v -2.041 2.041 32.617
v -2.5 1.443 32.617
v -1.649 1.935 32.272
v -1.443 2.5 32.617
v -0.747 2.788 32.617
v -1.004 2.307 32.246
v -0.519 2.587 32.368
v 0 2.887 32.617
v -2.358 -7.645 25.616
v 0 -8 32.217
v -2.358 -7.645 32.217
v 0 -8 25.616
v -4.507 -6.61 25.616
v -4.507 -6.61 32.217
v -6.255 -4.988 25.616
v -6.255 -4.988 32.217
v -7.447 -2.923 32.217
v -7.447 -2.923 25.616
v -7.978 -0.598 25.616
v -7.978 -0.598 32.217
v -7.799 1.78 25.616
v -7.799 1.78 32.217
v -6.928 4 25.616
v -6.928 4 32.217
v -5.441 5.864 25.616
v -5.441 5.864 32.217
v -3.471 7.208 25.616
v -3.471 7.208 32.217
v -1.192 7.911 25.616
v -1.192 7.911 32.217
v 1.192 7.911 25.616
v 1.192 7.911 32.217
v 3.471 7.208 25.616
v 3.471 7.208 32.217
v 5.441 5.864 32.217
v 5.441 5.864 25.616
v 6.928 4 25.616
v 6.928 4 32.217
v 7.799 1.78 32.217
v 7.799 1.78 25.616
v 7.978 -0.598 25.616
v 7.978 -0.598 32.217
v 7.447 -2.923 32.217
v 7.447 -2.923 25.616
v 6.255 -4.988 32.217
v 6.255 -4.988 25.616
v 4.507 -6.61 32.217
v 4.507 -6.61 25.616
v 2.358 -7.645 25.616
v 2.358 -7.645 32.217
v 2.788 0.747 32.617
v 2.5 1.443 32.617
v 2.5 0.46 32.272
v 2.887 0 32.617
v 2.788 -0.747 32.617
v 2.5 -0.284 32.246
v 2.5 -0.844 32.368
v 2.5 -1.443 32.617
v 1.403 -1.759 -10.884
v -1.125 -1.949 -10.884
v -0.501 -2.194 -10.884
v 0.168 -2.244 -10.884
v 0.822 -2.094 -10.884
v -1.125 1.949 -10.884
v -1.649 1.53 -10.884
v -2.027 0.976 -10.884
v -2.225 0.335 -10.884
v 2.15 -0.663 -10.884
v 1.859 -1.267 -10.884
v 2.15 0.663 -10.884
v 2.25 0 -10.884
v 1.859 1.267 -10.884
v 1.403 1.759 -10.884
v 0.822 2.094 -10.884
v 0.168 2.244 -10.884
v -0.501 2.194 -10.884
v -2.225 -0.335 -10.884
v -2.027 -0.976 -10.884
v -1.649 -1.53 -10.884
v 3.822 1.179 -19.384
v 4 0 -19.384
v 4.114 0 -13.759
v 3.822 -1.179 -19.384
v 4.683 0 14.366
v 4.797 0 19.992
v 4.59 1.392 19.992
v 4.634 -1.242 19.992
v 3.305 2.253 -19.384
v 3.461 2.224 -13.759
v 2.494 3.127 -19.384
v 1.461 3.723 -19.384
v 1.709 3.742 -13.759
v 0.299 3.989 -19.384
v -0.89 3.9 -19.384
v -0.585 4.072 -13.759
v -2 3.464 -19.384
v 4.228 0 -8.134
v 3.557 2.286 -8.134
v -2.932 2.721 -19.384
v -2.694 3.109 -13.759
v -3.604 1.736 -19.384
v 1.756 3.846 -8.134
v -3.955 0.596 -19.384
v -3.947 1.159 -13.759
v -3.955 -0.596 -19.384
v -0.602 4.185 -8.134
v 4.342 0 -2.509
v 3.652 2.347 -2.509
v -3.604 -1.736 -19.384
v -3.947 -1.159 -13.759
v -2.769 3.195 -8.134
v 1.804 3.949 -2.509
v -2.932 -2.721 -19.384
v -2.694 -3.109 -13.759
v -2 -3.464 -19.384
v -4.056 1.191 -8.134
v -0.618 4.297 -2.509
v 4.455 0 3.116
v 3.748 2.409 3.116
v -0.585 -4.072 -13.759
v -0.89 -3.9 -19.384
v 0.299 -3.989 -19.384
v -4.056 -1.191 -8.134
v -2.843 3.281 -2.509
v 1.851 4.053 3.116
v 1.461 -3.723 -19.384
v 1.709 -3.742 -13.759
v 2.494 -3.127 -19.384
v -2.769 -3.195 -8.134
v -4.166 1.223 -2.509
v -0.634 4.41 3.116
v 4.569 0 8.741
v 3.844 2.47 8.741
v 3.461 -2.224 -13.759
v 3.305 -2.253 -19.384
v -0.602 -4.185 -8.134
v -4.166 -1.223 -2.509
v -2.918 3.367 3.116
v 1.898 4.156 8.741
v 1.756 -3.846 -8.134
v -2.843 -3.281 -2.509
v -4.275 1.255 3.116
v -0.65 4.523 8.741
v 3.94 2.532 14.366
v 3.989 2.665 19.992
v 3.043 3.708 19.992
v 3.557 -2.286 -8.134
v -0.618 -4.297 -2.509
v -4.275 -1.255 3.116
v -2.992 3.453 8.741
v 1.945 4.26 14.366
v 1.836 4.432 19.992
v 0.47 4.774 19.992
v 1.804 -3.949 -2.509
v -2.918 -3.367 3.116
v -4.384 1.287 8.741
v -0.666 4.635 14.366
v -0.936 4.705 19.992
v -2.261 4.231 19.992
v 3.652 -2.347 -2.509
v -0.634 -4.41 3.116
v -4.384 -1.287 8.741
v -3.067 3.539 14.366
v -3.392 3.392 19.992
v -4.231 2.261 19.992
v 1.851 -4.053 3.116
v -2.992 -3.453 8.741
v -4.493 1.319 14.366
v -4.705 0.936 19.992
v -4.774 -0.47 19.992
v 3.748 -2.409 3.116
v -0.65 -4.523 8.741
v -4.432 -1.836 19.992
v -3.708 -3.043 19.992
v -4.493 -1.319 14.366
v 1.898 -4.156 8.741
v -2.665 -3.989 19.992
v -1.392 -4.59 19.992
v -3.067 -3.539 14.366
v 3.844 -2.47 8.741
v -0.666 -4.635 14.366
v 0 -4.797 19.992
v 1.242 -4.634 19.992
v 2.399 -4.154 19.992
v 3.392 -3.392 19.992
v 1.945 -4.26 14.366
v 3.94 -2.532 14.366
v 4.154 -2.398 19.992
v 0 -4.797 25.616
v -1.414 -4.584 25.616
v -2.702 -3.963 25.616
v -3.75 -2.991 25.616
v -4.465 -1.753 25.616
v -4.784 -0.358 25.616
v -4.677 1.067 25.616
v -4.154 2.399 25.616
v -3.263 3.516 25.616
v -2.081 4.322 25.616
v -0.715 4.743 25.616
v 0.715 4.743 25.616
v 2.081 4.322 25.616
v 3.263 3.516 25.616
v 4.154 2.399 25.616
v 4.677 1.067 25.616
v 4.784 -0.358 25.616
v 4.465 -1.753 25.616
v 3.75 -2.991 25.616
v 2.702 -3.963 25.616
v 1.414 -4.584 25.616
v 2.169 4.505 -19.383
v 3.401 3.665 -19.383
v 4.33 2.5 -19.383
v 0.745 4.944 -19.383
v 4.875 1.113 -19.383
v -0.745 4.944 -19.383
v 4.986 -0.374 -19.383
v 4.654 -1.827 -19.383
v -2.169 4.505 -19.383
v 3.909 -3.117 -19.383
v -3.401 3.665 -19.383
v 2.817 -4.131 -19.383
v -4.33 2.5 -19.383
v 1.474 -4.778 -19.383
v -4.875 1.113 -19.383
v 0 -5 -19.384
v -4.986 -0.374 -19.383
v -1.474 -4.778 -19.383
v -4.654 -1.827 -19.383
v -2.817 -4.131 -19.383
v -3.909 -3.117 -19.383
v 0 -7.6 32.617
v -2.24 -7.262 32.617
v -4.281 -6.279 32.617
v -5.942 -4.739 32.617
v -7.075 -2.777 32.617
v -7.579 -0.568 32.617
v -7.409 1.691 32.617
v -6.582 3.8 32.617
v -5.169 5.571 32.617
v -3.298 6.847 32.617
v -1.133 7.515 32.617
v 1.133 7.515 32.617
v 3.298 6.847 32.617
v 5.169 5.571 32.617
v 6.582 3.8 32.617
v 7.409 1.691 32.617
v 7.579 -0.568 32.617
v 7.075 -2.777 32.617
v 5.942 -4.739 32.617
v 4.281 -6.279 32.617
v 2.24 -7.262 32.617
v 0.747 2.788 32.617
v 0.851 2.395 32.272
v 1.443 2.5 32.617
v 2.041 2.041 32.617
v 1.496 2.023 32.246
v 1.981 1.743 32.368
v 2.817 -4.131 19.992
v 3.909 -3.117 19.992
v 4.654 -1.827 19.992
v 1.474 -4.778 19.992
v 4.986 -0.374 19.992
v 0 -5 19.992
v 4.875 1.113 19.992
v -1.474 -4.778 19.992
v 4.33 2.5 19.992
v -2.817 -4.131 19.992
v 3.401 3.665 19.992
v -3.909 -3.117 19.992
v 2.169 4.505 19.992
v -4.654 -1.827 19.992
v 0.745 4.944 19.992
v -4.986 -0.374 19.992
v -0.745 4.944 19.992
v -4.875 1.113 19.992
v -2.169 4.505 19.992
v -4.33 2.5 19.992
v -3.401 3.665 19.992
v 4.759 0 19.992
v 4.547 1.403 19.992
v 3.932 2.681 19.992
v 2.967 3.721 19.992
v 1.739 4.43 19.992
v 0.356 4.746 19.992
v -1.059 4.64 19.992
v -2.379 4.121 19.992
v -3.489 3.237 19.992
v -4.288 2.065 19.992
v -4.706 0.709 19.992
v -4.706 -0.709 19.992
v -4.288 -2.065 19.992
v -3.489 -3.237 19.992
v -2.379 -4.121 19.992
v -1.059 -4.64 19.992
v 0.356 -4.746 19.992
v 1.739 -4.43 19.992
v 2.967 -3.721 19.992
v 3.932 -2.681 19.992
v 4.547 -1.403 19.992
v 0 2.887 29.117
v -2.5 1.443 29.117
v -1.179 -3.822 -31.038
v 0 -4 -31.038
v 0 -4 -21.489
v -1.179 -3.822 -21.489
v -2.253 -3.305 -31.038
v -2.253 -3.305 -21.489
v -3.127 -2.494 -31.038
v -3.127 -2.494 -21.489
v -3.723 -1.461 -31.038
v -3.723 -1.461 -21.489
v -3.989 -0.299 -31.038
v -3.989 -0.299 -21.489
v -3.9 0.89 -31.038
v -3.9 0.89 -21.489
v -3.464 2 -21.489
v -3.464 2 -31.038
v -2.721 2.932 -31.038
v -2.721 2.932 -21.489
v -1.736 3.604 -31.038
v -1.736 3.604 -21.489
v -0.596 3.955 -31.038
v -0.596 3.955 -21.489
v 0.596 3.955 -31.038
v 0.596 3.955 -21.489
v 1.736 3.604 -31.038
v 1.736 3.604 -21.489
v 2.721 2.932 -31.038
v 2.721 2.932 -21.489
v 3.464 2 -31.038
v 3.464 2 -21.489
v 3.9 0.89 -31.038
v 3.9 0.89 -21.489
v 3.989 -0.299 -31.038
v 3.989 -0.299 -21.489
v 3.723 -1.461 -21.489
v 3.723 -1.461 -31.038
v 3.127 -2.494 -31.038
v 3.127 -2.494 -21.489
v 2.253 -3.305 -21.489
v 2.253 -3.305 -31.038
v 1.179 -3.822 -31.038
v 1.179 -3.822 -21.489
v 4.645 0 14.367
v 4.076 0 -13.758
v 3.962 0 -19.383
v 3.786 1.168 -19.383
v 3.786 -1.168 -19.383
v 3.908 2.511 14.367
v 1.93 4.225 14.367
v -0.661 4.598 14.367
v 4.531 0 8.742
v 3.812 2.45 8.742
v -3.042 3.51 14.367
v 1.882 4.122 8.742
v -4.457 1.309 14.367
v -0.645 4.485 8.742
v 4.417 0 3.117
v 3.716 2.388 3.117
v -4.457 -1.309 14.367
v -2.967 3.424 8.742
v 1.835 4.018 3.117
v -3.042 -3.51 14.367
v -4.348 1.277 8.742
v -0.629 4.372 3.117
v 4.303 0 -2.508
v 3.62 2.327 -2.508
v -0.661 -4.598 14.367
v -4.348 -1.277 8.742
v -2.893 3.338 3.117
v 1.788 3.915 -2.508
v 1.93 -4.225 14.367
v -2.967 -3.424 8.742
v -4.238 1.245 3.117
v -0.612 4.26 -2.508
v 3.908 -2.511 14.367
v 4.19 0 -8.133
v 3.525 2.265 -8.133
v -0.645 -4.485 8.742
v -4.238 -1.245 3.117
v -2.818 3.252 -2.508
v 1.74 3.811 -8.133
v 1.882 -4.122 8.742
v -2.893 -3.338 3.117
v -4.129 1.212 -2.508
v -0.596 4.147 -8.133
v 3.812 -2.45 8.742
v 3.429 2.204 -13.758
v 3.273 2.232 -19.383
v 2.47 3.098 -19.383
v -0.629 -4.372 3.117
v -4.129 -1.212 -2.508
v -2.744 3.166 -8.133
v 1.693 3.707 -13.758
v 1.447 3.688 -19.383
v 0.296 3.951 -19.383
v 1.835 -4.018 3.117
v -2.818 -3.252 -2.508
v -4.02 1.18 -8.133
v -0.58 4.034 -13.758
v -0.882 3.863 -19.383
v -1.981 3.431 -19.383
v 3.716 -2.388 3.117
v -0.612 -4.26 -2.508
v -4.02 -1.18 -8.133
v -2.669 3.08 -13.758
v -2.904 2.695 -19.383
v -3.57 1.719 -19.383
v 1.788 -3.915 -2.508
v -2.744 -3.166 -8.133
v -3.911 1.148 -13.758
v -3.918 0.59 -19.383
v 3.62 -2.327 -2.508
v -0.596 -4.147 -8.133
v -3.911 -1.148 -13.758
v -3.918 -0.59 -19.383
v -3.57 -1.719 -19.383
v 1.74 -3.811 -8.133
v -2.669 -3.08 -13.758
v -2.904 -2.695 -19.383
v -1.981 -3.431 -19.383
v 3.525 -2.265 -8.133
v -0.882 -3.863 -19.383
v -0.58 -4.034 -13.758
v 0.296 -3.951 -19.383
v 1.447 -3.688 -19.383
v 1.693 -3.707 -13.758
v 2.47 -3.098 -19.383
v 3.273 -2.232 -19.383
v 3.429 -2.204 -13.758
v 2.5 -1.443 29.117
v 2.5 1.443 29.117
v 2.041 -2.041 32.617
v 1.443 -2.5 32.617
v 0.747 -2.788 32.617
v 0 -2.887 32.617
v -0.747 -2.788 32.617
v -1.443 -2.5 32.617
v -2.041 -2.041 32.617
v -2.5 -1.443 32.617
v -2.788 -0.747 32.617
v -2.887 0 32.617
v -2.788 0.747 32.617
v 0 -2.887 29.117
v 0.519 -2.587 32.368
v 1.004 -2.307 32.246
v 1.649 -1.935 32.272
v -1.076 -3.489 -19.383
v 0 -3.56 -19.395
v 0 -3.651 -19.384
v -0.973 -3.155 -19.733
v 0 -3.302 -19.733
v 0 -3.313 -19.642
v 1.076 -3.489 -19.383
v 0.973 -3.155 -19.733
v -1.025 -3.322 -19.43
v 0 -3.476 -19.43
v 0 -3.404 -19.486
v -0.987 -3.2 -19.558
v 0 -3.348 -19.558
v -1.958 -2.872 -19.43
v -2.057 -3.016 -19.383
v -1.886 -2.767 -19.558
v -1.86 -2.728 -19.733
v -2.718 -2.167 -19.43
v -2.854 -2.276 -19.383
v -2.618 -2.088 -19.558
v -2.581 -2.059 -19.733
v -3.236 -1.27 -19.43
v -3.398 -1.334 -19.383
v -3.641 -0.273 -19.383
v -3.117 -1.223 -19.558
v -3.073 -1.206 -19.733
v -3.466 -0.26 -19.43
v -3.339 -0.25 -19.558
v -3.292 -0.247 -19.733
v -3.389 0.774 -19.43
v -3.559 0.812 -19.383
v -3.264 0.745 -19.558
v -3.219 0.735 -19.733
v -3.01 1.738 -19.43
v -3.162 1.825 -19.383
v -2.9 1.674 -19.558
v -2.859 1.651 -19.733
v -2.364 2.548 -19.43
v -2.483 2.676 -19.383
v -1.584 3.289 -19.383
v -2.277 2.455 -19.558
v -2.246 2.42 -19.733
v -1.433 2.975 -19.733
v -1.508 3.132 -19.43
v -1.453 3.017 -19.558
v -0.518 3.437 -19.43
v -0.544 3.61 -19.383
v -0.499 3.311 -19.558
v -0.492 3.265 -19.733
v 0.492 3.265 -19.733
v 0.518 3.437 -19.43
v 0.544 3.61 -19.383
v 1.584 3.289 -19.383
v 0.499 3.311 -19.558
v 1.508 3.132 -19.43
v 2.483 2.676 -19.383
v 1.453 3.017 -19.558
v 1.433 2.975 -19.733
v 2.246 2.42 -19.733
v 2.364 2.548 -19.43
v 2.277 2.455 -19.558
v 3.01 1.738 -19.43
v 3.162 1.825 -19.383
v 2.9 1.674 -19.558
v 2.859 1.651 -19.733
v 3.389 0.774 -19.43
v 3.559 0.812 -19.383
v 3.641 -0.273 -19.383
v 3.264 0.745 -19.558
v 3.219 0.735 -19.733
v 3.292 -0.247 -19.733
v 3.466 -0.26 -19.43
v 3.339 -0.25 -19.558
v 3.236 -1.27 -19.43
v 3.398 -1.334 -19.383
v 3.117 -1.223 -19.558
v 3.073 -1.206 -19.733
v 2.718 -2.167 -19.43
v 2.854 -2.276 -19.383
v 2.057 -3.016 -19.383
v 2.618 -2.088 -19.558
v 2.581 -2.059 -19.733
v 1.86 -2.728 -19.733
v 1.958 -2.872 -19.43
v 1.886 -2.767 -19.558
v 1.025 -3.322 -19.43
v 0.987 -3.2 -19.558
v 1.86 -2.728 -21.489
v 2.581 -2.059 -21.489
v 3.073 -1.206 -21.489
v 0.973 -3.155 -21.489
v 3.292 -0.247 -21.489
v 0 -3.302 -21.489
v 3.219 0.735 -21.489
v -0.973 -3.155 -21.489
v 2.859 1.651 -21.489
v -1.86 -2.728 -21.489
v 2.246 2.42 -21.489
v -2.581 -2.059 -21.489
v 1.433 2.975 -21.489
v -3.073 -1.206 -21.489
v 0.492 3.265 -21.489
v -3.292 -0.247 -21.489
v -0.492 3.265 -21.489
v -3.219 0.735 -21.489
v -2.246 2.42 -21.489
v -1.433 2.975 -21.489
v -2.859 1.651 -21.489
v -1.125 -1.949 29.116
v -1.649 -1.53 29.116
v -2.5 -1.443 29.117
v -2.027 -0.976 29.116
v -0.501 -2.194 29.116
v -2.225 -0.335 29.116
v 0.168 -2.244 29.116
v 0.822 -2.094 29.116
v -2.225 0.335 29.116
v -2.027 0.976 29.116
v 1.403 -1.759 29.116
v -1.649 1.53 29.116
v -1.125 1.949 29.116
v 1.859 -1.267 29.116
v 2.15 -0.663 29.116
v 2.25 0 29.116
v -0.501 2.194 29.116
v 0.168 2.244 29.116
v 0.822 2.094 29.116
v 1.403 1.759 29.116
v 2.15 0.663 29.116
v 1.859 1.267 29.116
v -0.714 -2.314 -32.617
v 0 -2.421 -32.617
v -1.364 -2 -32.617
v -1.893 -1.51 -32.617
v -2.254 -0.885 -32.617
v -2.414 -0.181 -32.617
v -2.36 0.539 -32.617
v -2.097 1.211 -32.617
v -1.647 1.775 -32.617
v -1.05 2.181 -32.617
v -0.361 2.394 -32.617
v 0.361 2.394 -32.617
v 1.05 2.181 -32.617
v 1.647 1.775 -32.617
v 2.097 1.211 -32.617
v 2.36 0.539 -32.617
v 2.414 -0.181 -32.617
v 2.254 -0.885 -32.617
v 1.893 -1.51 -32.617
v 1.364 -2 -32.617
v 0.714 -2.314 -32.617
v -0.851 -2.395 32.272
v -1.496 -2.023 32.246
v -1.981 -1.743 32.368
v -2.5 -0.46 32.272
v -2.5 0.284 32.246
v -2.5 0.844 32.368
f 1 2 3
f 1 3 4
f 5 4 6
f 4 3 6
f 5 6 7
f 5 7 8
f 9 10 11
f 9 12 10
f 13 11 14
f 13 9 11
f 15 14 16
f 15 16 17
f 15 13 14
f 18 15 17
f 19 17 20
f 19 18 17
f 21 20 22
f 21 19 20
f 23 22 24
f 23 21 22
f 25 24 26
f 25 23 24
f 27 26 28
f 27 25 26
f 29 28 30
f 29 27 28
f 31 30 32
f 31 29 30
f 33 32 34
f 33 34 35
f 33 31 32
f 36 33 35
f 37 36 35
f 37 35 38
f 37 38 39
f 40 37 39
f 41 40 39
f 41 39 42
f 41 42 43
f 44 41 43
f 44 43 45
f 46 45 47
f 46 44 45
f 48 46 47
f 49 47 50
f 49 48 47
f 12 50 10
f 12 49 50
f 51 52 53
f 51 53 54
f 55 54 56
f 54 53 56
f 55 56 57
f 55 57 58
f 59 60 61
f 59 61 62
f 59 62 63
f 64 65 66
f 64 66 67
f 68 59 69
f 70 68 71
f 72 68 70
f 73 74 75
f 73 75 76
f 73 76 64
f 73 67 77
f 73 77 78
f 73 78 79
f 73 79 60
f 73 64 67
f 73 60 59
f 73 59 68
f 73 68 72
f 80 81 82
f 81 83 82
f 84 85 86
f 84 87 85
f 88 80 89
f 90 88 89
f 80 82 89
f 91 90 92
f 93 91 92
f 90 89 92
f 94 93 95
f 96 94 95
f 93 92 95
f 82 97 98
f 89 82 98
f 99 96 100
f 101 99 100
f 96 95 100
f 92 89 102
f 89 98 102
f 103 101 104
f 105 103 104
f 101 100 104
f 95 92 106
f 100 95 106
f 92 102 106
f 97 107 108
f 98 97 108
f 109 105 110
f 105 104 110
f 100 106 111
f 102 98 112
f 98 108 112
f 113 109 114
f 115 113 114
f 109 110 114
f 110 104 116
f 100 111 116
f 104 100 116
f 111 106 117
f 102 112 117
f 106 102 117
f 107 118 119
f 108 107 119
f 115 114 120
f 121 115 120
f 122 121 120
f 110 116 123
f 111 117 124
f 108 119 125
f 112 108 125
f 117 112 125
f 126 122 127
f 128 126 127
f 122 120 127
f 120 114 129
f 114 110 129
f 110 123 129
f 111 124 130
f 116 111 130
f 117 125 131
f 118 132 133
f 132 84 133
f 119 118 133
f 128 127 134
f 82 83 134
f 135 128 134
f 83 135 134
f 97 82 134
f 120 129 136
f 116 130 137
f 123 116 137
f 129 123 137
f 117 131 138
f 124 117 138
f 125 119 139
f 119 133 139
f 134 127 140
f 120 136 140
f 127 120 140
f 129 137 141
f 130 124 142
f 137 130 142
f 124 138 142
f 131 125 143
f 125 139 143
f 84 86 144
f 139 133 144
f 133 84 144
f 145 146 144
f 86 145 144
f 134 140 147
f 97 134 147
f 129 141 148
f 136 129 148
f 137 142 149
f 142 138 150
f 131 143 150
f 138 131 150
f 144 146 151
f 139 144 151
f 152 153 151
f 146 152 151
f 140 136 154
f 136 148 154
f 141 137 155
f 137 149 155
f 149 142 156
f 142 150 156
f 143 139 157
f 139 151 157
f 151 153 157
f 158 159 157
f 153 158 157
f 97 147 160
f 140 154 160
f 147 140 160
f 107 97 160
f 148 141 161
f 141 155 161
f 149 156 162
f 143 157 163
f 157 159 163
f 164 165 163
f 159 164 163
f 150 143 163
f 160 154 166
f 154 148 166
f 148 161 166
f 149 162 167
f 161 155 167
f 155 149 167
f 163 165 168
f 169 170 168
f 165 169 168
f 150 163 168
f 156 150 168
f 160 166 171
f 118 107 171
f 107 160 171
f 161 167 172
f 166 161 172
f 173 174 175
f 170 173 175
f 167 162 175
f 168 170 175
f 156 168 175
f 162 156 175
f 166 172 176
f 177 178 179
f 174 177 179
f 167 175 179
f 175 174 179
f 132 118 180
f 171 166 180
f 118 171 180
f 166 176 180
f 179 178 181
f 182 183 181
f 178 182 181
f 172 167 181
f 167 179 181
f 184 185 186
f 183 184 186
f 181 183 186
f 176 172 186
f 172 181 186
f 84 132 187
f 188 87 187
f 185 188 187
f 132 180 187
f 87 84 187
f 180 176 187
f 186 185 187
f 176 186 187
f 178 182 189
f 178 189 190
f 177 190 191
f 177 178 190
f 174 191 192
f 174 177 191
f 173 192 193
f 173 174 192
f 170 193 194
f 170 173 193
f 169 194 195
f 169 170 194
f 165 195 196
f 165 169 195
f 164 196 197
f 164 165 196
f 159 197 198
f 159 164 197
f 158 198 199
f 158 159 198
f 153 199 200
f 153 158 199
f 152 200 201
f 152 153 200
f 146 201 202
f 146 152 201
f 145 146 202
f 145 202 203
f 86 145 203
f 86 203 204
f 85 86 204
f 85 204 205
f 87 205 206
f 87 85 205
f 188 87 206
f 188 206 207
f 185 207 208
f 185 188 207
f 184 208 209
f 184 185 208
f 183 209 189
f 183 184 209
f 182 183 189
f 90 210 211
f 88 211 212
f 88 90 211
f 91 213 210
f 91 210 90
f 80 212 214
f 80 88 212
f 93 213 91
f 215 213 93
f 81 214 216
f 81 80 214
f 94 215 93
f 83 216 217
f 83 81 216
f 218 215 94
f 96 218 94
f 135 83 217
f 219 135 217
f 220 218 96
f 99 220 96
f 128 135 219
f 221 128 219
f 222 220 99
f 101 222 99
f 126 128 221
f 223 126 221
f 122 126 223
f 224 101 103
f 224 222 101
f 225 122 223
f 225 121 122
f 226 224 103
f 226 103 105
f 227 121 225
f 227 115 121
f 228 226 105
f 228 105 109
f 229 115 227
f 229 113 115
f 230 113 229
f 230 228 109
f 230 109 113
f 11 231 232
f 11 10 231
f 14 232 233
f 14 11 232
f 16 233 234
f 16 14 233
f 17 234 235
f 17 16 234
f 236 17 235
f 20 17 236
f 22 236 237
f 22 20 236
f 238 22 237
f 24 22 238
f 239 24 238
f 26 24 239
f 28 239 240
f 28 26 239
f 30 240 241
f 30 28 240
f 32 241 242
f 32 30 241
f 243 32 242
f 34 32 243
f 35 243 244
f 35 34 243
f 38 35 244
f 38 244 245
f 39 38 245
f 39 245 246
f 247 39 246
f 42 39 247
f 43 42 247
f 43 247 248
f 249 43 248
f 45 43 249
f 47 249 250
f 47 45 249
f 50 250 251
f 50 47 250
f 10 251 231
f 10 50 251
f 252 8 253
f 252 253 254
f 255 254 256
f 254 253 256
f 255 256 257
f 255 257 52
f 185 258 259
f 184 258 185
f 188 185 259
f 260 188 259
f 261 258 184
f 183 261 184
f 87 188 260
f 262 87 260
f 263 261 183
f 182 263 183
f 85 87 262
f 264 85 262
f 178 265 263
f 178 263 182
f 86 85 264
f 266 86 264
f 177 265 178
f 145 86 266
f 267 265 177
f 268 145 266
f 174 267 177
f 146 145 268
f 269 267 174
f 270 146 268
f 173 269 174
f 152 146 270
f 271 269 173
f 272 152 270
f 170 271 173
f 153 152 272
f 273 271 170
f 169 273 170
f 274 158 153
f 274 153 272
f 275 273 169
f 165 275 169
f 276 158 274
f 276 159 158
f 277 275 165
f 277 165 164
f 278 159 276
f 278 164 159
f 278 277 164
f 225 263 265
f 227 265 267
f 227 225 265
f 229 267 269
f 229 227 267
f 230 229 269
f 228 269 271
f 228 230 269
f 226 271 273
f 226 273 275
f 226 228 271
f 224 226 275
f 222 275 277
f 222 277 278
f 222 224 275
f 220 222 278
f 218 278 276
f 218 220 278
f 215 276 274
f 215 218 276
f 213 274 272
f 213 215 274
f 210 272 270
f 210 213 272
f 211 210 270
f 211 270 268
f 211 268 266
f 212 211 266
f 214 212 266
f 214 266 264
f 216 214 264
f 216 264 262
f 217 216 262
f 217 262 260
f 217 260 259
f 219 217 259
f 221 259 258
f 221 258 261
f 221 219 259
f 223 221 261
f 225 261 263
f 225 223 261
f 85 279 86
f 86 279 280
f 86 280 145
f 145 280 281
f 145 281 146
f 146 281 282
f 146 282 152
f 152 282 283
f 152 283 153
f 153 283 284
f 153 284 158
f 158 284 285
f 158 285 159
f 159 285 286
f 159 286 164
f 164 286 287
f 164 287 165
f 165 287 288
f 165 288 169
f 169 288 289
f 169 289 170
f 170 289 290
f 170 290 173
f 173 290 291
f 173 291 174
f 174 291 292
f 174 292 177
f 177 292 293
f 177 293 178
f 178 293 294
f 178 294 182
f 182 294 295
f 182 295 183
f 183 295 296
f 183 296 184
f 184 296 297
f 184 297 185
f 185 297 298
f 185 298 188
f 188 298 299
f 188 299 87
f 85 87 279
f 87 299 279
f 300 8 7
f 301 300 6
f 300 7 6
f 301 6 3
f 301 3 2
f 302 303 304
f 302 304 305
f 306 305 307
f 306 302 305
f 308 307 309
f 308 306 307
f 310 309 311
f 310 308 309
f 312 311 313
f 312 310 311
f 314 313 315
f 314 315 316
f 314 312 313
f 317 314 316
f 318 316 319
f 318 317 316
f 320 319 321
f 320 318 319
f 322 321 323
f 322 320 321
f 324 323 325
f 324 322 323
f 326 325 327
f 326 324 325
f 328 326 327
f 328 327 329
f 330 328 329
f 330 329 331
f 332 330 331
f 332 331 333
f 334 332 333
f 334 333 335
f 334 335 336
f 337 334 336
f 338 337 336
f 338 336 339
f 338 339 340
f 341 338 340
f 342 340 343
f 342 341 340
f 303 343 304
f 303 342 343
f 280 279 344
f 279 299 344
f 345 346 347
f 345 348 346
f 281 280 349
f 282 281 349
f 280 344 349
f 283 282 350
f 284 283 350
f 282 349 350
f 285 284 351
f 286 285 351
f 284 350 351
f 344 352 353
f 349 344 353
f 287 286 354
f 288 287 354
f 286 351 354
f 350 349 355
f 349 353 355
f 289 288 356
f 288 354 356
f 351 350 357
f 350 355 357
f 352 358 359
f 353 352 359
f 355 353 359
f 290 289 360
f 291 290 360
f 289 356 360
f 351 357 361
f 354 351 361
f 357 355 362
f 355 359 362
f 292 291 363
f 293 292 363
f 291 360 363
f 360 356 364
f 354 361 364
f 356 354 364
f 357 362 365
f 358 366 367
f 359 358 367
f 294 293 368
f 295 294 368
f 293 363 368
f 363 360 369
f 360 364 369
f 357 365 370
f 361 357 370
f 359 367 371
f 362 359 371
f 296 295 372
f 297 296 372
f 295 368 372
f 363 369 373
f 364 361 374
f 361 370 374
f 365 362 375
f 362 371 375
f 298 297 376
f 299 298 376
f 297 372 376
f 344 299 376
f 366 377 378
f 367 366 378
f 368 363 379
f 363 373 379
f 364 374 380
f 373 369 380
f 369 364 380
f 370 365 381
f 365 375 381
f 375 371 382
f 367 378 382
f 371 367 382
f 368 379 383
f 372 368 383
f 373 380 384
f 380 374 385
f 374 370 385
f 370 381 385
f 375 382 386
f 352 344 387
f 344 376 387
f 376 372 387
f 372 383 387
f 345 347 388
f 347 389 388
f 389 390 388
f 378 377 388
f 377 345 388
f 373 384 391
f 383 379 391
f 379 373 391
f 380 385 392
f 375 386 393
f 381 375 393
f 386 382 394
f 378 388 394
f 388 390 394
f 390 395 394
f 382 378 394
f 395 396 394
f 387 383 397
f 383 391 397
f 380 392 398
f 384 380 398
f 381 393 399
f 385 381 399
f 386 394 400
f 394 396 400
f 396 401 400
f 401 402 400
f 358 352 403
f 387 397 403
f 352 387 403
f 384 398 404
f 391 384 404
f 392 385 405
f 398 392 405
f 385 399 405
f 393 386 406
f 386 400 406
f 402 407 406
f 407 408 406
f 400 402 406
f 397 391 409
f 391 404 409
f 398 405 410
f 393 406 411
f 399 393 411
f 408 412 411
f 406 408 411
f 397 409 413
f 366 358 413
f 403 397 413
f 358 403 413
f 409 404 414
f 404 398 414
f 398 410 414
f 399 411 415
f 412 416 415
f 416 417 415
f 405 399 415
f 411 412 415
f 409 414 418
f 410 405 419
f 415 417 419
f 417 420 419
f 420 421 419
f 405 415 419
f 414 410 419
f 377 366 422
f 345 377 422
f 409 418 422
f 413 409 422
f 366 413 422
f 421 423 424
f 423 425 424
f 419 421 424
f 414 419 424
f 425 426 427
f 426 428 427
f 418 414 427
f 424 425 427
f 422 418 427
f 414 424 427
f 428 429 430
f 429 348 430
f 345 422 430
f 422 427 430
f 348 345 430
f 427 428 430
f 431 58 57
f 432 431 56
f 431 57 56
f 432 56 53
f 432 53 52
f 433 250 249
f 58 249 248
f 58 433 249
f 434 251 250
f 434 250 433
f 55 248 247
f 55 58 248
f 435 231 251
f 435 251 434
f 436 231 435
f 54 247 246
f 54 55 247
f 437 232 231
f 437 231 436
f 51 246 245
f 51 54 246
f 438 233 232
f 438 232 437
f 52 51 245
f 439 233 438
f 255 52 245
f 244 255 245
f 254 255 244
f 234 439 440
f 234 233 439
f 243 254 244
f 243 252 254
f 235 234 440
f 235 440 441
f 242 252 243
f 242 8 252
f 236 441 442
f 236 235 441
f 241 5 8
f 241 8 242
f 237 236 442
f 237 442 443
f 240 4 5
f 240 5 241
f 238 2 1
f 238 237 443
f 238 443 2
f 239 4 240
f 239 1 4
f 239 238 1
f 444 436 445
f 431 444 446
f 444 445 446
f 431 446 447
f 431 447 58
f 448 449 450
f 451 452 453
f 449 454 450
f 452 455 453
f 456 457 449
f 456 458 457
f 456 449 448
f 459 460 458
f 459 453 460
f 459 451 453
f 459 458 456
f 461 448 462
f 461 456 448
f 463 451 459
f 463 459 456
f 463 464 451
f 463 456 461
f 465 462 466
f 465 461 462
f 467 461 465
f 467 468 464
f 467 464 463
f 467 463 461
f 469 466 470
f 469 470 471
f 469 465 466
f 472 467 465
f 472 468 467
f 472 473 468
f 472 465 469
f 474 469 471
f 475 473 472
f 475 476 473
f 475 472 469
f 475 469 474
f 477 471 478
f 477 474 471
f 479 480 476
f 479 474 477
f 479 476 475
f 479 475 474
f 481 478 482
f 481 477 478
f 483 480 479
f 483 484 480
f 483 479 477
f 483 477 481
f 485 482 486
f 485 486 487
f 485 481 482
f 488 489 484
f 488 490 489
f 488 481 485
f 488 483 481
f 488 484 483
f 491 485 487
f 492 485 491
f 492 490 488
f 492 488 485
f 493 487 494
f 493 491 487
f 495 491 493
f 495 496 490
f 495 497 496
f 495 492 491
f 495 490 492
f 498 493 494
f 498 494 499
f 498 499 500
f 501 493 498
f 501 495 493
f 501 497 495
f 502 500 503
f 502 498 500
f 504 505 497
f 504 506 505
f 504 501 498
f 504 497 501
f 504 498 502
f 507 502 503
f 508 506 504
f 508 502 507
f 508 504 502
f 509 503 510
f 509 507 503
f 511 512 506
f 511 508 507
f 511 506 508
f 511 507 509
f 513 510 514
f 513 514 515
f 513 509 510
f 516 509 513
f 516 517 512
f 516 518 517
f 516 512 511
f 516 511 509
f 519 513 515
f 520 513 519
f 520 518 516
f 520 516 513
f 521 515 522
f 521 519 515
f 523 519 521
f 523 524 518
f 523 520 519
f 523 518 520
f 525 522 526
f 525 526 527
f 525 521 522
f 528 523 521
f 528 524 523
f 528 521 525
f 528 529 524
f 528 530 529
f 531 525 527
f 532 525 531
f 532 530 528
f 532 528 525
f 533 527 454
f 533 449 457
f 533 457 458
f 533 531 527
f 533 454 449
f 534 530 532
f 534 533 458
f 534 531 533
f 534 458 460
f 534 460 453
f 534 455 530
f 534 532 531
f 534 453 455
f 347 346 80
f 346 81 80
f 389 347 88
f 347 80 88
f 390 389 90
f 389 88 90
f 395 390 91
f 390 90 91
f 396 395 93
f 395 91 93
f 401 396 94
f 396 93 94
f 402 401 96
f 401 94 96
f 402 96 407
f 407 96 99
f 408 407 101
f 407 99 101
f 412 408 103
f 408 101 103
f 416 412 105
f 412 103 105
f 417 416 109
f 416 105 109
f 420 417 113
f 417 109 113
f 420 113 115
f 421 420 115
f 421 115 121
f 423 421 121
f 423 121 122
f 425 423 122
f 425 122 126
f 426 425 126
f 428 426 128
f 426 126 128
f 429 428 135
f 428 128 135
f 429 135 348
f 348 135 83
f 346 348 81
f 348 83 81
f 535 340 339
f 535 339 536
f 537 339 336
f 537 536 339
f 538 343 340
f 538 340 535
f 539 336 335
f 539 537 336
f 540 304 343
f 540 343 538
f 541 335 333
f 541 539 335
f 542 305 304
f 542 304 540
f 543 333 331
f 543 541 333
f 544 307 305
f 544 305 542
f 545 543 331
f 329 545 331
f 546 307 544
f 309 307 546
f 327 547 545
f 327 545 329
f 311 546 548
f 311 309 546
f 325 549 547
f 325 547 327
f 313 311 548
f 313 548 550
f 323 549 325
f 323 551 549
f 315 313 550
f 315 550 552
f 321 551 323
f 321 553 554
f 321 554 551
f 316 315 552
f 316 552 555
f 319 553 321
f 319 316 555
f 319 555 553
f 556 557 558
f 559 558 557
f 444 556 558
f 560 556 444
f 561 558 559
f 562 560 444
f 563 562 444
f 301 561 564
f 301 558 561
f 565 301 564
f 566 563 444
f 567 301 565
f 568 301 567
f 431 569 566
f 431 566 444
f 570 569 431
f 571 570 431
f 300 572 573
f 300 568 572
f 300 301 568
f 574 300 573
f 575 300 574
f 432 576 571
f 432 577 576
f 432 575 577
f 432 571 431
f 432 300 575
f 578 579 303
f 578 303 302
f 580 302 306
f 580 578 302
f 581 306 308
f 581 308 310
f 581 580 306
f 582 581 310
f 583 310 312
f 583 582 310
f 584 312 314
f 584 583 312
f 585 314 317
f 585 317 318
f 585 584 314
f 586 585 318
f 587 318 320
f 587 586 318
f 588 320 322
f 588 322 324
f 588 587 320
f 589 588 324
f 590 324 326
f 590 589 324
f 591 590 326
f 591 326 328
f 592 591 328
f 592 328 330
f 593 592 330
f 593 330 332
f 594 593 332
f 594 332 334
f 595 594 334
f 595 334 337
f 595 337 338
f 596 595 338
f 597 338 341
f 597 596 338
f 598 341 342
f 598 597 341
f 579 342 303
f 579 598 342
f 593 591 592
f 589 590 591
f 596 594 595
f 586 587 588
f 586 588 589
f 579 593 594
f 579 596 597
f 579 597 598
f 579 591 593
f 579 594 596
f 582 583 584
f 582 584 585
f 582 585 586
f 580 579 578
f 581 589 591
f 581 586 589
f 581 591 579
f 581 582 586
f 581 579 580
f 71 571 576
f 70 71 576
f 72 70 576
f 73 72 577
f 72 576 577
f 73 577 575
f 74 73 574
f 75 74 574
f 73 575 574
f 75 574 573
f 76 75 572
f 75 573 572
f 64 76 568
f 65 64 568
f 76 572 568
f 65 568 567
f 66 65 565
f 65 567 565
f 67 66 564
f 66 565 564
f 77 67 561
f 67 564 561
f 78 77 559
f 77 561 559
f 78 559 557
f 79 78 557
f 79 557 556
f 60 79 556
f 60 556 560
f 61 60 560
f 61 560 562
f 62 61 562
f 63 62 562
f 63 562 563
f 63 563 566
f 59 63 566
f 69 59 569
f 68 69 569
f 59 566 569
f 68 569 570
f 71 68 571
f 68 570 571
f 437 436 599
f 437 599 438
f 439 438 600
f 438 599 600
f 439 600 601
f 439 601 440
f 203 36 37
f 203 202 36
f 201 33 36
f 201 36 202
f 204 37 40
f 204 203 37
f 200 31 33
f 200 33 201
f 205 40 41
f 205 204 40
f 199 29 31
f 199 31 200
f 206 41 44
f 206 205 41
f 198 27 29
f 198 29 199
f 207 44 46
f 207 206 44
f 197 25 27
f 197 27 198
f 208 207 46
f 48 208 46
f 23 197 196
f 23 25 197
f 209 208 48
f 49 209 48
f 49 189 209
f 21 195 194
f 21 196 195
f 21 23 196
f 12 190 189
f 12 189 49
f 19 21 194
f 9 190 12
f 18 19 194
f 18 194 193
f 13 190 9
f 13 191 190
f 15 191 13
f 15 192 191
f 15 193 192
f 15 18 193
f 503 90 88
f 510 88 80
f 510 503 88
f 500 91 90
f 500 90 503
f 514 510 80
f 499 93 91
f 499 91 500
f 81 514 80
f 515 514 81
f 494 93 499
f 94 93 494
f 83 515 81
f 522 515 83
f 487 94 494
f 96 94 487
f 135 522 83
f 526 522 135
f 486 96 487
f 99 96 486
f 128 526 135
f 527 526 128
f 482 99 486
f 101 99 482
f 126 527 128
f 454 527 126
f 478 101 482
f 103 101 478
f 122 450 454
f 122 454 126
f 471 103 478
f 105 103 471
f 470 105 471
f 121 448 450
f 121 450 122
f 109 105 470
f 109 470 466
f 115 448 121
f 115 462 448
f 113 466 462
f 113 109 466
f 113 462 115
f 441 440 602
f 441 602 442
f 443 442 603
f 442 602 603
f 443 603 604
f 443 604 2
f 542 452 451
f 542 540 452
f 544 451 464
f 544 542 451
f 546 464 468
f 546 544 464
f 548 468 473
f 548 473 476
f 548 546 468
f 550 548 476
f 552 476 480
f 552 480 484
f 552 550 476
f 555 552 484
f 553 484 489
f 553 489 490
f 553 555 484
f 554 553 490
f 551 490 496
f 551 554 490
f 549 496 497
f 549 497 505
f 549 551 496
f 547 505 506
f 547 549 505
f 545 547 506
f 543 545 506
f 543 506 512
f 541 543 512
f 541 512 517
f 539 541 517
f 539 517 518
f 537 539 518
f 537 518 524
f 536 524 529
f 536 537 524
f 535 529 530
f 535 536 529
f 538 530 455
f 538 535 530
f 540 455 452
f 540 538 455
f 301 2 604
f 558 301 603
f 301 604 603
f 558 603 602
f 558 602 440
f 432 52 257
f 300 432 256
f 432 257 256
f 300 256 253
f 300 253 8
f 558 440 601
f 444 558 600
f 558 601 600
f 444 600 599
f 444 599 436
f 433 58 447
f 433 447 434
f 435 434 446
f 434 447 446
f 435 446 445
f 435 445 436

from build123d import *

# Parameters (mm, degrees)
CUT_EXTRUDE1_START = 32.6165
CUT_EXTRUDE1_DEPTH = 3.5
CHAMFER2_SIZE      = 1.578938402
SKETCH16_R         = 2.25
CUT_EXTRUDE3_DEPTH = 40


# Read off the part's stored shape, not the designer's step: Cut-Revolve-Thin1
with BuildPart() as part:
    # Sketch3 → Revolve1 (revolve)
    with BuildSketch(Plane(origin=(0, 0, 0), x_dir=(0, 0, -1), z_dir=(1, 0, 0)), mode=Mode.PRIVATE) as revolve1_sk:
        with BuildLine():
            Line((-32.6165, 0), (-32.6165, 7.48))
            Line((-32.6165, 7.48), (-32.6165, 8))
            Line((-32.6165, 8), (-26.1365, 8))
            Line((-26.1365, 8), (-25.6165, 8))
            Line((-25.6165, 8), (-25.6165, 4.797))
            Line((-25.6165, 4.797), (-19.9915, 4.797))
            Line((-19.9915, 4.797), (-19.9915, 5))
            Line((-19.9915, 5), (19.3835, 5))
            Line((19.3835, 5), (19.3835, 3.650794))
            ThreePointArc((19.3835, 3.650794), (19.485780069, 3.403868069), (19.732706, 3.301588))
            Line((19.732706, 3.301588), (21.488751203, 3.301588))
            Line((21.488751203, 3.301588), (21.488751203, 4))
            Line((21.488751203, 4), (31.679, 4))
            Line((31.679, 4), (32.6165, 4))
            Line((32.6165, 4), (32.6165, 0))
            Line((32.6165, 0), (-32.6165, 0))
        make_face()
    revolve(revolve1_sk.sketch.rotate(Axis((0, 0, 32.6165), (0, 0, -1)), 180), axis=Axis((0, 0, 32.6165), (0, 0, -1)))

    # Cut-Revolve-Thin1 outline → Cut-Revolve-Thin1 (revolve, cut)
    with BuildSketch(Plane.XZ):
        Polygon((4.758907803, 19.992271034), (3.961907803, -19.382728966), (4, -19.3835), (4.797, 19.9915), align=None)
    revolve(axis=Axis((0, 0, 0), (0, 0, 1)), mode=Mode.SUBTRACT)

    # Sketch4 → Cut-Extrude1 (cut)
    with BuildSketch(Plane.XY.offset(CUT_EXTRUDE1_START)):
        Polygon((0, 2.886751346), (-2.5, 1.443375673), (-2.5, -1.443375673), (0, -2.886751346), (2.5, -1.443375673), (2.5, 1.443375673), align=None)
    extrude(amount=-CUT_EXTRUDE1_DEPTH, mode=Mode.SUBTRACT)

    # Cut-Extrude2 cone 1 section (through the dimple's axis) → Cut-Extrude2 (revolve, cut)
    with BuildSketch(Plane(origin=(0, 0, 32.6165), x_dir=(0, -1, 0), z_dir=(1, 0, 0))):
        Polygon((0, 0), (2.886751346, 0), (0, 2.886751346), align=None)
    revolve(axis=Axis((0, 0, 32.6165), (0, 0, -1)), mode=Mode.SUBTRACT)

    # Chamfer2
    chamfer2_edges = [part.edges().sort_by_distance(p)[0] for p in [
        (0, 4, -32.6165),
    ]]
    chamfer(chamfer2_edges, length=CHAMFER2_SIZE)

    # Sketch10 → Cut-Revolve2 (revolve, cut)
    with BuildSketch(Plane(origin=(0, 0, 0), x_dir=(0, 0, -1), z_dir=(1, 0, 0)), mode=Mode.PRIVATE) as cut_revolve2_sk:
        Polygon((-32.6165, 7.6), (-32.2165, 8), (-32.6165, 8), align=None)
    revolve(cut_revolve2_sk.sketch.rotate(Axis((0, 0, 32.6165), (0, 0, -1)), 180), axis=Axis((0, 0, 32.6165), (0, 0, -1)), mode=Mode.SUBTRACT)

    # Sketch16 → Cut-Extrude3 (cut)
    with BuildSketch(Plane.XY.offset(29.1165)):
        Circle(SKETCH16_R)
    extrude(amount=-CUT_EXTRUDE3_DEPTH, mode=Mode.SUBTRACT)


solid = part.part
